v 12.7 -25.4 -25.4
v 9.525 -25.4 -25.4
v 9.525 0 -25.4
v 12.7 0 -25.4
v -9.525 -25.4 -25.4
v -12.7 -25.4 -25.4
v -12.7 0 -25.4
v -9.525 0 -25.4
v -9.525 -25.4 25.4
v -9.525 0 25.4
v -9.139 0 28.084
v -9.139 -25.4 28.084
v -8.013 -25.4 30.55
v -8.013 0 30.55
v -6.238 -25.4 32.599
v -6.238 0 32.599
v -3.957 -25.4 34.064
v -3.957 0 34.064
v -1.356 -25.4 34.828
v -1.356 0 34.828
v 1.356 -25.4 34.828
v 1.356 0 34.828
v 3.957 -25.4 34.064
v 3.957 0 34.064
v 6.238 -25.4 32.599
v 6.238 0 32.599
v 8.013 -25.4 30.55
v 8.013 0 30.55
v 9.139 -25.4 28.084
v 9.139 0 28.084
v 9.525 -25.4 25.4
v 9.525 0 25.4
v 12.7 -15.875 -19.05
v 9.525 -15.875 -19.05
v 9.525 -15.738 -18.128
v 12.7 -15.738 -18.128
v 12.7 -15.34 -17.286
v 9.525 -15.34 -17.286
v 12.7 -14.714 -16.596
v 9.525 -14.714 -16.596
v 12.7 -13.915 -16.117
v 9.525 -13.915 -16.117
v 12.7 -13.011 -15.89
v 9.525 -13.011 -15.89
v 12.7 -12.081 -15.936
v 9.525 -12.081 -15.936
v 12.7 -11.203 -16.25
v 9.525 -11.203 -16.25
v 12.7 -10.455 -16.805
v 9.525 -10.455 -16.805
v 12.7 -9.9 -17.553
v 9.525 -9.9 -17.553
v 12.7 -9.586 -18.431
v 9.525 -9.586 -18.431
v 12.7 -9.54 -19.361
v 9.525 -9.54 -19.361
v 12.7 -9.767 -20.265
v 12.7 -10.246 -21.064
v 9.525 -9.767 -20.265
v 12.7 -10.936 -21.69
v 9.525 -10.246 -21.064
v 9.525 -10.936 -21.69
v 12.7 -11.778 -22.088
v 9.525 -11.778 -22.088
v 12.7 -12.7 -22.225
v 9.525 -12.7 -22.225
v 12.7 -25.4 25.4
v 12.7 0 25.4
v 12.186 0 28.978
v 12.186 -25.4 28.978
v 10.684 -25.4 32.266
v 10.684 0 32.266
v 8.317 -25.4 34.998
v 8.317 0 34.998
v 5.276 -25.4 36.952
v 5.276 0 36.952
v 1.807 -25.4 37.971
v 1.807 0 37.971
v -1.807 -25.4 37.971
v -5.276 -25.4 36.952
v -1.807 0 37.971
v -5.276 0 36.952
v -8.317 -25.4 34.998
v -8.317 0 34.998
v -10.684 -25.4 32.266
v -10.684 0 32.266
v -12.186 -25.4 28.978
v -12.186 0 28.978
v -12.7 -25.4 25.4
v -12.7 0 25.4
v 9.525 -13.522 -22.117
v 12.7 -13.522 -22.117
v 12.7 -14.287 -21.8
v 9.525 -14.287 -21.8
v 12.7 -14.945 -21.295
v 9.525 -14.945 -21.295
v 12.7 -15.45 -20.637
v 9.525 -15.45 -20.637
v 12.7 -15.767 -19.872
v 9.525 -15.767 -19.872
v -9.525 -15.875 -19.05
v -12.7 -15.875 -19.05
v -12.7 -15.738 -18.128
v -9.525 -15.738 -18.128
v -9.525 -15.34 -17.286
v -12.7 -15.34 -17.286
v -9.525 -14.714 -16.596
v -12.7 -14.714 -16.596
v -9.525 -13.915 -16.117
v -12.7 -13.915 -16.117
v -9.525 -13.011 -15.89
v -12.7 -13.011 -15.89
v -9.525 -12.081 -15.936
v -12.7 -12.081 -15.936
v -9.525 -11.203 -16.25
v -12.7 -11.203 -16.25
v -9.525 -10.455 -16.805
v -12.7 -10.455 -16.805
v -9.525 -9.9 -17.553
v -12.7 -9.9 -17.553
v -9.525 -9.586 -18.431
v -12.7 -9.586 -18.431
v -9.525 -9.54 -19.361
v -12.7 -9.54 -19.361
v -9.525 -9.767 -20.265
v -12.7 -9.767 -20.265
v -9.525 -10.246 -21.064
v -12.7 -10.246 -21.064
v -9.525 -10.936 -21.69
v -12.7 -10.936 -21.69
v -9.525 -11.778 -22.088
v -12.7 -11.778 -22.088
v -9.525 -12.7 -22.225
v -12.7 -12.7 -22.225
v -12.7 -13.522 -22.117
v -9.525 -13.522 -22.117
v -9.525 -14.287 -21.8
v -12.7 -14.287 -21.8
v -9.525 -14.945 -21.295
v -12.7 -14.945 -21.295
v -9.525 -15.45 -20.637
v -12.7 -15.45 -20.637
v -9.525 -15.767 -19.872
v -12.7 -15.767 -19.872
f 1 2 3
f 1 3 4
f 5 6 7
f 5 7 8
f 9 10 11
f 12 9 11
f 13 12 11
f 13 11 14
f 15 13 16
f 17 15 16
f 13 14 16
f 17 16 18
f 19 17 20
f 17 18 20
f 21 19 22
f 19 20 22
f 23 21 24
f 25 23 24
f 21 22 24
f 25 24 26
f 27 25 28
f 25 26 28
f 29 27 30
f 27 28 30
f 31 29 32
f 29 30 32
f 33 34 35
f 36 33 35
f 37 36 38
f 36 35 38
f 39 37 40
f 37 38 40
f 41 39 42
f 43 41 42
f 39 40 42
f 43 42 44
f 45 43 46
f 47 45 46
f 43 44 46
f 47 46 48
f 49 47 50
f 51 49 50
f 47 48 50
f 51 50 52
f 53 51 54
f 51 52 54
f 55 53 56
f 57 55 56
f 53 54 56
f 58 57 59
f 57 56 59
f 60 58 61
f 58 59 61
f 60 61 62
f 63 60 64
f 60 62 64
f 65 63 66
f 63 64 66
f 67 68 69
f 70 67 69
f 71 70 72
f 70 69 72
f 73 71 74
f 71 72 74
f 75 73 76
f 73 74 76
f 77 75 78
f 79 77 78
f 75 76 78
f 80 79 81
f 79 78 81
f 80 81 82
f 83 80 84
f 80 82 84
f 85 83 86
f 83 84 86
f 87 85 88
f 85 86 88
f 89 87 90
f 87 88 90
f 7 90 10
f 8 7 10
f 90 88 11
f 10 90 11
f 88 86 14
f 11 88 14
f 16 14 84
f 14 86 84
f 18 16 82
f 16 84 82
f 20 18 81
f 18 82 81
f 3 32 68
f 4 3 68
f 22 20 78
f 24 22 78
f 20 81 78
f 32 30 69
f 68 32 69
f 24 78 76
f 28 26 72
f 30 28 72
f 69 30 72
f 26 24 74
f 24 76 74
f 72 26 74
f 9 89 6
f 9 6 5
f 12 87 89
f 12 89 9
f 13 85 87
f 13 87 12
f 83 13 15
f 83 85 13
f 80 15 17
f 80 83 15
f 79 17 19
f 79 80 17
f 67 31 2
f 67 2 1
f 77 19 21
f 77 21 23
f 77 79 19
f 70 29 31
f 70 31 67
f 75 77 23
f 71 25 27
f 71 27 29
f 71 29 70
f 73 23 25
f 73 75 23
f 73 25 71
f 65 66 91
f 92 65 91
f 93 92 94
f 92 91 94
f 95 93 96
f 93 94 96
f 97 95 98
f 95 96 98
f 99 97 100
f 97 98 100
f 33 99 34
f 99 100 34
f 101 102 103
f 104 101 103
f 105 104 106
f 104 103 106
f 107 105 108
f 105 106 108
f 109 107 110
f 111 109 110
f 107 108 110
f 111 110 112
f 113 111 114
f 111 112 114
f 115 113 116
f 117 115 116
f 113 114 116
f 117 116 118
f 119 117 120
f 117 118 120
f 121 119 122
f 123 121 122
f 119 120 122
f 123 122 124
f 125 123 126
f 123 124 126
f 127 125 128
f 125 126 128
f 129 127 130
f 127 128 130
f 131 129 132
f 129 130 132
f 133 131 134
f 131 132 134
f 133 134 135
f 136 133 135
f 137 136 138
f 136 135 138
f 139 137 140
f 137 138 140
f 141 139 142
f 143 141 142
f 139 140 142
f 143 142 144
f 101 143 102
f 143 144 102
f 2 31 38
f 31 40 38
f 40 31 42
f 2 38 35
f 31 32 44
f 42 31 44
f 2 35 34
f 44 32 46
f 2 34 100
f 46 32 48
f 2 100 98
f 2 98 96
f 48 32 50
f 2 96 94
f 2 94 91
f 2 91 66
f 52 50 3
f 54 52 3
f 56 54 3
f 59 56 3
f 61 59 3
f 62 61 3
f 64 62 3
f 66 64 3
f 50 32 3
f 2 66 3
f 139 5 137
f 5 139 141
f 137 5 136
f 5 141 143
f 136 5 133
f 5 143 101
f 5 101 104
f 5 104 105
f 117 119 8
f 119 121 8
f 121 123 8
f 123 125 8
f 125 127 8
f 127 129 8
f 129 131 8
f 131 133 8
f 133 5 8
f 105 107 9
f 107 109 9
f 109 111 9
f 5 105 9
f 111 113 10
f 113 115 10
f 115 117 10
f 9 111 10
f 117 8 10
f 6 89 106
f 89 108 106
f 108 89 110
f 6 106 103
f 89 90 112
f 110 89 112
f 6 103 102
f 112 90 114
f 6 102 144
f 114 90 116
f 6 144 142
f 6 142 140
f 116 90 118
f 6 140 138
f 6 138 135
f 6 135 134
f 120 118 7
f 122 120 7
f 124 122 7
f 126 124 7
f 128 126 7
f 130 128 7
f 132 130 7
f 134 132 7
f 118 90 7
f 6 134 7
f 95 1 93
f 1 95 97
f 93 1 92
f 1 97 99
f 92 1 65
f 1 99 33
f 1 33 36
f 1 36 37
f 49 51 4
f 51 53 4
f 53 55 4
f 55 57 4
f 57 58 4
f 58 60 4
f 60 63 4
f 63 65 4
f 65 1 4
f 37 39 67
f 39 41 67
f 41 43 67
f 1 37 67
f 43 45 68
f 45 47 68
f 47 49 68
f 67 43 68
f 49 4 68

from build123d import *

# Parameters (mm, degrees)
F1_DEPTH = 25.4
F3_DEPTH = 50.8


with BuildPart() as f1:
    # F0 (on Front) → F1 (new body)
    with BuildSketch(Plane.XZ):
        with BuildLine():
            ThreePointArc((12.7, 25.4), (0, 38.1), (-12.7, 25.4))
            Line((-12.7, 25.4), (-12.7, -25.4))
            Line((-12.7, -25.4), (-9.525, -25.4))
            Line((-9.525, -25.4), (-9.525, 25.4))
            ThreePointArc((-9.525, 25.4), (0, 34.925), (9.525, 25.4))
            Line((9.525, 25.4), (9.525, -25.4))
            Line((9.525, -25.4), (12.7, -25.4))
            Line((12.7, -25.4), (12.7, 25.4))
        make_face()
    extrude(amount=F1_DEPTH)

    # F2 (on face) → F3 (cut, symmetric)
    with BuildSketch(Plane(origin=(-12.7, 0, 0), x_dir=(0, -1, 0), z_dir=(-1, 0, 0))):
        with BuildLine():
            ThreePointArc((15.875, -19.05), (10.454936, -16.804936), (12.7, -22.225))
            ThreePointArc((12.7, -22.225), (14.945064, -21.295064), (15.875, -19.05))
        make_face()
    extrude(amount=F3_DEPTH, both=True, mode=Mode.SUBTRACT)


solid = f1.part
